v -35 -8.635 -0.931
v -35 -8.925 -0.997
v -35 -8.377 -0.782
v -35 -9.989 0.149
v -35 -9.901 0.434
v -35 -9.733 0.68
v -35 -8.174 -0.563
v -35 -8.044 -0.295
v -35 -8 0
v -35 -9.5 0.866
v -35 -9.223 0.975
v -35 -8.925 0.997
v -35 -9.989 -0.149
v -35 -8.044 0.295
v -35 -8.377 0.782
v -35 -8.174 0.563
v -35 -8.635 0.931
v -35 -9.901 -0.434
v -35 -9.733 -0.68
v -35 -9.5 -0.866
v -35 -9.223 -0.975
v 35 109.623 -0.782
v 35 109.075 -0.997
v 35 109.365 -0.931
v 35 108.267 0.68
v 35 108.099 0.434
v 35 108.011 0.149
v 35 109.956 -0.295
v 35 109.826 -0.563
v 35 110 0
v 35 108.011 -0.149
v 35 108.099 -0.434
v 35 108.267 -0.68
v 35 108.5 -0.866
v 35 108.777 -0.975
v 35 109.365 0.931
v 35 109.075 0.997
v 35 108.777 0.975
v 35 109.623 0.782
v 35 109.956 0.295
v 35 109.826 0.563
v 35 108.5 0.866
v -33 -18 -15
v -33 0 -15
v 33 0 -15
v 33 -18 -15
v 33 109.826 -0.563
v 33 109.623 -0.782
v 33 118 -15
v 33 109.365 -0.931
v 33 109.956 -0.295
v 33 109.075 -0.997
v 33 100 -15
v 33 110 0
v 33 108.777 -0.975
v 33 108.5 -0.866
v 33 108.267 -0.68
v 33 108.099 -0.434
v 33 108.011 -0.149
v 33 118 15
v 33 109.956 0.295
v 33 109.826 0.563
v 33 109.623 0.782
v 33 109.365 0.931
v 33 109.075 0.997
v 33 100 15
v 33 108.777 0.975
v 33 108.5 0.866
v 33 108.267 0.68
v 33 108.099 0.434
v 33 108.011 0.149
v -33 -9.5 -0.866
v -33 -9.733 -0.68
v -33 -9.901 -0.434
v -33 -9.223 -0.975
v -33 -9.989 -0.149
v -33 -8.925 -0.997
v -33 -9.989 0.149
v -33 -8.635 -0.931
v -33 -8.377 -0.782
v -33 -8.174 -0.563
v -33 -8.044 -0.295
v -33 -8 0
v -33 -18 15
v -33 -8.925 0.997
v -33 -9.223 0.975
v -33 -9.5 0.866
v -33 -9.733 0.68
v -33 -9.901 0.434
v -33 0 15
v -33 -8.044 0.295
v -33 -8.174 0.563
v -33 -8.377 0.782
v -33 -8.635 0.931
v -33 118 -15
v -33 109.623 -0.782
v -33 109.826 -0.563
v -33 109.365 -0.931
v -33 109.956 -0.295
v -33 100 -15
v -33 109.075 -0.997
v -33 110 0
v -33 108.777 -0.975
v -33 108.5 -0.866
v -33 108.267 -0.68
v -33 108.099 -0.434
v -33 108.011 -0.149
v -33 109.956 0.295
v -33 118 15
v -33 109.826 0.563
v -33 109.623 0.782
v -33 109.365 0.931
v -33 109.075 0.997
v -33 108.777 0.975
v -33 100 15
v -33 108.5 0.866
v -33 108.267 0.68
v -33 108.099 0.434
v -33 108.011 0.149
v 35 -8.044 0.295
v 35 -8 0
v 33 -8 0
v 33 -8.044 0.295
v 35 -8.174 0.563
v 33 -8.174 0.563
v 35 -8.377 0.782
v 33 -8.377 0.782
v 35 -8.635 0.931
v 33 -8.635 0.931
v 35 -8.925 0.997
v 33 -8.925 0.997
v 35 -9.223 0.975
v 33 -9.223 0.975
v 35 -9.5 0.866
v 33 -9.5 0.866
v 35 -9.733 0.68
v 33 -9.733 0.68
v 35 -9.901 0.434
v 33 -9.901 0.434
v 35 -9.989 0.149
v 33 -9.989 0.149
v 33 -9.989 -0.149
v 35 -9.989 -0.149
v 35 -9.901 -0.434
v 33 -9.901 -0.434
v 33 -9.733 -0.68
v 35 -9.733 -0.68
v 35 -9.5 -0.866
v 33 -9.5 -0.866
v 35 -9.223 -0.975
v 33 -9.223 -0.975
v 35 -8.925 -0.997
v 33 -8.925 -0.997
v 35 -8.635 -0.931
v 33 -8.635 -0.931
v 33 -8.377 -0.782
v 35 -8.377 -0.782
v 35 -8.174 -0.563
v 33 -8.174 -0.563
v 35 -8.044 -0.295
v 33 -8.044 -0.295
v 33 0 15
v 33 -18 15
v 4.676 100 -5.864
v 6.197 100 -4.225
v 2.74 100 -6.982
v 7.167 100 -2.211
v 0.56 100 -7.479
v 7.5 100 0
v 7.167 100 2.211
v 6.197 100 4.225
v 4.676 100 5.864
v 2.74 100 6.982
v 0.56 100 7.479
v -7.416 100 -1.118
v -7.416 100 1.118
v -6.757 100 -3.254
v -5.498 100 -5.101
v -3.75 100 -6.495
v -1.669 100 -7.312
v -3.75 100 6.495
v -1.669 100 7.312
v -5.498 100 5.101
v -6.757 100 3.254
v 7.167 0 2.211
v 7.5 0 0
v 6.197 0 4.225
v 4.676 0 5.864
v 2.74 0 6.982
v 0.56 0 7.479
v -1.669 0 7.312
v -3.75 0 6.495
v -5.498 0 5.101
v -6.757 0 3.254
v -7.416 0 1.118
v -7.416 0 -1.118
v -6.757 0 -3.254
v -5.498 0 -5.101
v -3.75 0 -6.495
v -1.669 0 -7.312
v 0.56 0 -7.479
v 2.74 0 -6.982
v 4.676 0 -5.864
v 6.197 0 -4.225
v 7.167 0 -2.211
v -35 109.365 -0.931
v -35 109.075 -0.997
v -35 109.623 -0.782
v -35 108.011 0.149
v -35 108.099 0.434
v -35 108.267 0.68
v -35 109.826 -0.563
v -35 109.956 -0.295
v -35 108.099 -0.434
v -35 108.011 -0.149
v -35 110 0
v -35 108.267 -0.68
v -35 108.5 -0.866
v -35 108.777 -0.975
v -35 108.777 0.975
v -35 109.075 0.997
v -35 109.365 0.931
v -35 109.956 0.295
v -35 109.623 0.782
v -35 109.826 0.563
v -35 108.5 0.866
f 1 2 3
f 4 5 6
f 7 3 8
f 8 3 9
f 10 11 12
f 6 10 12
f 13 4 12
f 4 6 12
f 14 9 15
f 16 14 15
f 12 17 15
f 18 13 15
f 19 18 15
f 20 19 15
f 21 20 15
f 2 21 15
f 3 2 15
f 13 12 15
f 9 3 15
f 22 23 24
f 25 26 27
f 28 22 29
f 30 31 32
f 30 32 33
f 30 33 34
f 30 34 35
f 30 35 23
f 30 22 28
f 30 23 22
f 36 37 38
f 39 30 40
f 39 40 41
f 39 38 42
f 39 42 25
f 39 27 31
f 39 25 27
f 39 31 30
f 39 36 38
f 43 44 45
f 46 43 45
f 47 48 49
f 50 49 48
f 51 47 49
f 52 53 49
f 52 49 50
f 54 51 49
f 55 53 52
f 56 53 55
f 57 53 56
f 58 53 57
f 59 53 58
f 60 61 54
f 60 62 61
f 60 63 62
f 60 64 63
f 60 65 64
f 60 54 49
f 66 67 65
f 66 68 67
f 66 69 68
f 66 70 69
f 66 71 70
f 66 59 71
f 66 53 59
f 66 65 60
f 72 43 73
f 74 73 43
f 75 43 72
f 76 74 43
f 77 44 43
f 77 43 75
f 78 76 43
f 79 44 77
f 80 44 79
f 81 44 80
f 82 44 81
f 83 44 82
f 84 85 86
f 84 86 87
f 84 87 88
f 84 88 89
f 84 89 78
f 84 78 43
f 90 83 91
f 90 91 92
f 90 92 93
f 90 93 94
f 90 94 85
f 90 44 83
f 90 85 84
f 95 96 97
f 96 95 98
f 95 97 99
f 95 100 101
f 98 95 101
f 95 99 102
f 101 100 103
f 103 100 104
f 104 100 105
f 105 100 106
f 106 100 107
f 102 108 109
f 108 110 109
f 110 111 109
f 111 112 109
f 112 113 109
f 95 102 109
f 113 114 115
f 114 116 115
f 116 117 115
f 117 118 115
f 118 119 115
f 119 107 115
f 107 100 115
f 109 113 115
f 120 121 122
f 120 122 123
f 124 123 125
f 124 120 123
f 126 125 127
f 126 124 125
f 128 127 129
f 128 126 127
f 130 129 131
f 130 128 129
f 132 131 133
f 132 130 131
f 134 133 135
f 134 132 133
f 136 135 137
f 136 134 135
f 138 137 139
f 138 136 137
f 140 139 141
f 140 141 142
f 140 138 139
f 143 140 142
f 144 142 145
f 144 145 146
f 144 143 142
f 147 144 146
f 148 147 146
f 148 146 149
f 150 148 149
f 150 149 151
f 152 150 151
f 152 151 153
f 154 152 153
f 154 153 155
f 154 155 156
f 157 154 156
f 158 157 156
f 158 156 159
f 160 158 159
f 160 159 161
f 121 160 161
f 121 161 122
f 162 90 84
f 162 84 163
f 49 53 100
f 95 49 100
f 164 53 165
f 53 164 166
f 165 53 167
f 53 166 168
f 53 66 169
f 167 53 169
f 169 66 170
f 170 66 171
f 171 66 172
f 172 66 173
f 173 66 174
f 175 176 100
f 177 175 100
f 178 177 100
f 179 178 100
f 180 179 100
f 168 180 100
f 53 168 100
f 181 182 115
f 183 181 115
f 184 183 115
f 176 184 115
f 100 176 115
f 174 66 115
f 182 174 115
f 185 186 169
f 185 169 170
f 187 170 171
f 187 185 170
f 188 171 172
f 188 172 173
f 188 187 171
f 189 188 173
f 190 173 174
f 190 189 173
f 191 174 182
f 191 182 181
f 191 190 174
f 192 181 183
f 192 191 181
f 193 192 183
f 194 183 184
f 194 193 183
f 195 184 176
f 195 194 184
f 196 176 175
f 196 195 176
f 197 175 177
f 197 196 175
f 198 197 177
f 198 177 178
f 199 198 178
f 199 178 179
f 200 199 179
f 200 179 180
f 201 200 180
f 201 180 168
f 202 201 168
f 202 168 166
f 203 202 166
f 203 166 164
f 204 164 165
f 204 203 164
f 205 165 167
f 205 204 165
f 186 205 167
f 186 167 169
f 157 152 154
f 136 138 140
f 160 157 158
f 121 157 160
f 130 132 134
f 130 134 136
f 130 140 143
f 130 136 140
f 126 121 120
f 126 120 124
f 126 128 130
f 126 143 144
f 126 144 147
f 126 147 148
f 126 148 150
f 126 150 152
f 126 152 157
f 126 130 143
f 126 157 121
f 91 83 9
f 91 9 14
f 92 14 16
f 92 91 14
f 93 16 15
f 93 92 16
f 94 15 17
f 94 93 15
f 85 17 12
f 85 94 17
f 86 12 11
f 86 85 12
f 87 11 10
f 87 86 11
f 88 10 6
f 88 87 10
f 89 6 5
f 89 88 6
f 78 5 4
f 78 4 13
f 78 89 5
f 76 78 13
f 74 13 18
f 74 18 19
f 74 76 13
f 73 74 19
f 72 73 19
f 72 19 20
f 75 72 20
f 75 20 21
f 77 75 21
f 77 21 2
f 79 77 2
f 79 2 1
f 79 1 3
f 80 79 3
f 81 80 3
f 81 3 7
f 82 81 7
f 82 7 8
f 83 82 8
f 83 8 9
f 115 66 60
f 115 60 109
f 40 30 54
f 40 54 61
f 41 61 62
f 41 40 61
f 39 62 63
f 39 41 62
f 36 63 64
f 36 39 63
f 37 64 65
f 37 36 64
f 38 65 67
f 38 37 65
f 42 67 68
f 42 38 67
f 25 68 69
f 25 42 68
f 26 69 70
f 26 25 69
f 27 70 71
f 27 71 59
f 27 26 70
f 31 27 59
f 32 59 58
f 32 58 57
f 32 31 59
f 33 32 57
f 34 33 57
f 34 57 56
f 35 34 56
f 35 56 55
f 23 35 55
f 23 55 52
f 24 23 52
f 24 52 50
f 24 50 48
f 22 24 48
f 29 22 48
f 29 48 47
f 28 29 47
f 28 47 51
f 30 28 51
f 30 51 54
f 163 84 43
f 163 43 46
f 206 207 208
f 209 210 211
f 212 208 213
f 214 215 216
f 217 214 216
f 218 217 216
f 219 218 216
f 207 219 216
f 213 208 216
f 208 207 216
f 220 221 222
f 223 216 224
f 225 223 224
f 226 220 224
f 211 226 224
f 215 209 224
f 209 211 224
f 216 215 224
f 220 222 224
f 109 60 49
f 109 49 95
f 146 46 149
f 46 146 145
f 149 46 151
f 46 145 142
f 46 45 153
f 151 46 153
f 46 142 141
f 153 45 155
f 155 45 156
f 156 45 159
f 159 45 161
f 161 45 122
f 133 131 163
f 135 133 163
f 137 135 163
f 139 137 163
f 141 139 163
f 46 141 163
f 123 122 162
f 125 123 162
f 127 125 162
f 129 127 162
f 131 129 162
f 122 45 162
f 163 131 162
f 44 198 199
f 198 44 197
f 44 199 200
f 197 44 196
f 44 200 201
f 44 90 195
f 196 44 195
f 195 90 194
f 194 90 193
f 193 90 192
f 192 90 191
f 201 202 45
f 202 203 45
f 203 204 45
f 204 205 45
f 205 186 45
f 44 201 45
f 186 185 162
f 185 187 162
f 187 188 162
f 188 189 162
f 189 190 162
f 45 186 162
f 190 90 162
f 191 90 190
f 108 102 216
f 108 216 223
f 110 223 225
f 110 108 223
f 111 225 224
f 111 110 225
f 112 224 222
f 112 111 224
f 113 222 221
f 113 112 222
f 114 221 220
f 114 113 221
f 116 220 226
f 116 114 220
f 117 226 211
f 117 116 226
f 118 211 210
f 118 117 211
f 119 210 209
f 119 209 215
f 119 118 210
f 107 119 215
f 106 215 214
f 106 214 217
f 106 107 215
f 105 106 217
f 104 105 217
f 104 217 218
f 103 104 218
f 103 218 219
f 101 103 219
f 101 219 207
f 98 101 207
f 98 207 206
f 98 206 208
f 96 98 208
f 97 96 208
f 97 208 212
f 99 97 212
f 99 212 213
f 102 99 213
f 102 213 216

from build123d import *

# Parameters (mm, degrees)
F0_W     = 66
F0_H     = 30
F0_R     = 7.5
F1_DEPTH = 18
F3_R     = 1
F4_DEPTH = 70
F5_DEPTH = 100
F6_W     = 66
F6_H     = 30
F6_R     = 7.5
F7_DEPTH = 18
F8_R     = 1
F9_DEPTH = 70


# Not quite as in the source:
# - a feature names something its author has since deleted; it is built from what else it names


with BuildPart() as f1:
    # F0 (on Front) → F1 (new body)
    with BuildSketch(Plane.XZ):
        Rectangle(F0_W, F0_H)
        Circle(F0_R, mode=Mode.SUBTRACT)
        Circle(F0_R)
    extrude(amount=F1_DEPTH)

    # F3 (on offset) → F4 (join)
    with BuildSketch(Plane.YZ.offset(35)):
        with Locations((-9.0000117198, 0)):
            Circle(F3_R)
    extrude(amount=-F4_DEPTH)

    # F0 (on Front) → F5 (join)
    with BuildSketch(Plane.XZ):
        Circle(F0_R)
    extrude(amount=-F5_DEPTH)

    # F6 (on face) → F7 (join)
    with BuildSketch(Plane(origin=(0, 100, 0), x_dir=(-1, 0, 0), z_dir=(0, 1, 0))):
        Rectangle(F6_W, F6_H)
        Circle(F6_R, mode=Mode.SUBTRACT)
        Circle(F6_R)
    extrude(amount=F7_DEPTH)

    # F8 (on offset) → F9 (join)
    with BuildSketch(Plane.YZ.offset(35)):
        with Locations((109, 0)):
            Circle(F8_R)
    extrude(amount=-F9_DEPTH)


solid = f1.part
